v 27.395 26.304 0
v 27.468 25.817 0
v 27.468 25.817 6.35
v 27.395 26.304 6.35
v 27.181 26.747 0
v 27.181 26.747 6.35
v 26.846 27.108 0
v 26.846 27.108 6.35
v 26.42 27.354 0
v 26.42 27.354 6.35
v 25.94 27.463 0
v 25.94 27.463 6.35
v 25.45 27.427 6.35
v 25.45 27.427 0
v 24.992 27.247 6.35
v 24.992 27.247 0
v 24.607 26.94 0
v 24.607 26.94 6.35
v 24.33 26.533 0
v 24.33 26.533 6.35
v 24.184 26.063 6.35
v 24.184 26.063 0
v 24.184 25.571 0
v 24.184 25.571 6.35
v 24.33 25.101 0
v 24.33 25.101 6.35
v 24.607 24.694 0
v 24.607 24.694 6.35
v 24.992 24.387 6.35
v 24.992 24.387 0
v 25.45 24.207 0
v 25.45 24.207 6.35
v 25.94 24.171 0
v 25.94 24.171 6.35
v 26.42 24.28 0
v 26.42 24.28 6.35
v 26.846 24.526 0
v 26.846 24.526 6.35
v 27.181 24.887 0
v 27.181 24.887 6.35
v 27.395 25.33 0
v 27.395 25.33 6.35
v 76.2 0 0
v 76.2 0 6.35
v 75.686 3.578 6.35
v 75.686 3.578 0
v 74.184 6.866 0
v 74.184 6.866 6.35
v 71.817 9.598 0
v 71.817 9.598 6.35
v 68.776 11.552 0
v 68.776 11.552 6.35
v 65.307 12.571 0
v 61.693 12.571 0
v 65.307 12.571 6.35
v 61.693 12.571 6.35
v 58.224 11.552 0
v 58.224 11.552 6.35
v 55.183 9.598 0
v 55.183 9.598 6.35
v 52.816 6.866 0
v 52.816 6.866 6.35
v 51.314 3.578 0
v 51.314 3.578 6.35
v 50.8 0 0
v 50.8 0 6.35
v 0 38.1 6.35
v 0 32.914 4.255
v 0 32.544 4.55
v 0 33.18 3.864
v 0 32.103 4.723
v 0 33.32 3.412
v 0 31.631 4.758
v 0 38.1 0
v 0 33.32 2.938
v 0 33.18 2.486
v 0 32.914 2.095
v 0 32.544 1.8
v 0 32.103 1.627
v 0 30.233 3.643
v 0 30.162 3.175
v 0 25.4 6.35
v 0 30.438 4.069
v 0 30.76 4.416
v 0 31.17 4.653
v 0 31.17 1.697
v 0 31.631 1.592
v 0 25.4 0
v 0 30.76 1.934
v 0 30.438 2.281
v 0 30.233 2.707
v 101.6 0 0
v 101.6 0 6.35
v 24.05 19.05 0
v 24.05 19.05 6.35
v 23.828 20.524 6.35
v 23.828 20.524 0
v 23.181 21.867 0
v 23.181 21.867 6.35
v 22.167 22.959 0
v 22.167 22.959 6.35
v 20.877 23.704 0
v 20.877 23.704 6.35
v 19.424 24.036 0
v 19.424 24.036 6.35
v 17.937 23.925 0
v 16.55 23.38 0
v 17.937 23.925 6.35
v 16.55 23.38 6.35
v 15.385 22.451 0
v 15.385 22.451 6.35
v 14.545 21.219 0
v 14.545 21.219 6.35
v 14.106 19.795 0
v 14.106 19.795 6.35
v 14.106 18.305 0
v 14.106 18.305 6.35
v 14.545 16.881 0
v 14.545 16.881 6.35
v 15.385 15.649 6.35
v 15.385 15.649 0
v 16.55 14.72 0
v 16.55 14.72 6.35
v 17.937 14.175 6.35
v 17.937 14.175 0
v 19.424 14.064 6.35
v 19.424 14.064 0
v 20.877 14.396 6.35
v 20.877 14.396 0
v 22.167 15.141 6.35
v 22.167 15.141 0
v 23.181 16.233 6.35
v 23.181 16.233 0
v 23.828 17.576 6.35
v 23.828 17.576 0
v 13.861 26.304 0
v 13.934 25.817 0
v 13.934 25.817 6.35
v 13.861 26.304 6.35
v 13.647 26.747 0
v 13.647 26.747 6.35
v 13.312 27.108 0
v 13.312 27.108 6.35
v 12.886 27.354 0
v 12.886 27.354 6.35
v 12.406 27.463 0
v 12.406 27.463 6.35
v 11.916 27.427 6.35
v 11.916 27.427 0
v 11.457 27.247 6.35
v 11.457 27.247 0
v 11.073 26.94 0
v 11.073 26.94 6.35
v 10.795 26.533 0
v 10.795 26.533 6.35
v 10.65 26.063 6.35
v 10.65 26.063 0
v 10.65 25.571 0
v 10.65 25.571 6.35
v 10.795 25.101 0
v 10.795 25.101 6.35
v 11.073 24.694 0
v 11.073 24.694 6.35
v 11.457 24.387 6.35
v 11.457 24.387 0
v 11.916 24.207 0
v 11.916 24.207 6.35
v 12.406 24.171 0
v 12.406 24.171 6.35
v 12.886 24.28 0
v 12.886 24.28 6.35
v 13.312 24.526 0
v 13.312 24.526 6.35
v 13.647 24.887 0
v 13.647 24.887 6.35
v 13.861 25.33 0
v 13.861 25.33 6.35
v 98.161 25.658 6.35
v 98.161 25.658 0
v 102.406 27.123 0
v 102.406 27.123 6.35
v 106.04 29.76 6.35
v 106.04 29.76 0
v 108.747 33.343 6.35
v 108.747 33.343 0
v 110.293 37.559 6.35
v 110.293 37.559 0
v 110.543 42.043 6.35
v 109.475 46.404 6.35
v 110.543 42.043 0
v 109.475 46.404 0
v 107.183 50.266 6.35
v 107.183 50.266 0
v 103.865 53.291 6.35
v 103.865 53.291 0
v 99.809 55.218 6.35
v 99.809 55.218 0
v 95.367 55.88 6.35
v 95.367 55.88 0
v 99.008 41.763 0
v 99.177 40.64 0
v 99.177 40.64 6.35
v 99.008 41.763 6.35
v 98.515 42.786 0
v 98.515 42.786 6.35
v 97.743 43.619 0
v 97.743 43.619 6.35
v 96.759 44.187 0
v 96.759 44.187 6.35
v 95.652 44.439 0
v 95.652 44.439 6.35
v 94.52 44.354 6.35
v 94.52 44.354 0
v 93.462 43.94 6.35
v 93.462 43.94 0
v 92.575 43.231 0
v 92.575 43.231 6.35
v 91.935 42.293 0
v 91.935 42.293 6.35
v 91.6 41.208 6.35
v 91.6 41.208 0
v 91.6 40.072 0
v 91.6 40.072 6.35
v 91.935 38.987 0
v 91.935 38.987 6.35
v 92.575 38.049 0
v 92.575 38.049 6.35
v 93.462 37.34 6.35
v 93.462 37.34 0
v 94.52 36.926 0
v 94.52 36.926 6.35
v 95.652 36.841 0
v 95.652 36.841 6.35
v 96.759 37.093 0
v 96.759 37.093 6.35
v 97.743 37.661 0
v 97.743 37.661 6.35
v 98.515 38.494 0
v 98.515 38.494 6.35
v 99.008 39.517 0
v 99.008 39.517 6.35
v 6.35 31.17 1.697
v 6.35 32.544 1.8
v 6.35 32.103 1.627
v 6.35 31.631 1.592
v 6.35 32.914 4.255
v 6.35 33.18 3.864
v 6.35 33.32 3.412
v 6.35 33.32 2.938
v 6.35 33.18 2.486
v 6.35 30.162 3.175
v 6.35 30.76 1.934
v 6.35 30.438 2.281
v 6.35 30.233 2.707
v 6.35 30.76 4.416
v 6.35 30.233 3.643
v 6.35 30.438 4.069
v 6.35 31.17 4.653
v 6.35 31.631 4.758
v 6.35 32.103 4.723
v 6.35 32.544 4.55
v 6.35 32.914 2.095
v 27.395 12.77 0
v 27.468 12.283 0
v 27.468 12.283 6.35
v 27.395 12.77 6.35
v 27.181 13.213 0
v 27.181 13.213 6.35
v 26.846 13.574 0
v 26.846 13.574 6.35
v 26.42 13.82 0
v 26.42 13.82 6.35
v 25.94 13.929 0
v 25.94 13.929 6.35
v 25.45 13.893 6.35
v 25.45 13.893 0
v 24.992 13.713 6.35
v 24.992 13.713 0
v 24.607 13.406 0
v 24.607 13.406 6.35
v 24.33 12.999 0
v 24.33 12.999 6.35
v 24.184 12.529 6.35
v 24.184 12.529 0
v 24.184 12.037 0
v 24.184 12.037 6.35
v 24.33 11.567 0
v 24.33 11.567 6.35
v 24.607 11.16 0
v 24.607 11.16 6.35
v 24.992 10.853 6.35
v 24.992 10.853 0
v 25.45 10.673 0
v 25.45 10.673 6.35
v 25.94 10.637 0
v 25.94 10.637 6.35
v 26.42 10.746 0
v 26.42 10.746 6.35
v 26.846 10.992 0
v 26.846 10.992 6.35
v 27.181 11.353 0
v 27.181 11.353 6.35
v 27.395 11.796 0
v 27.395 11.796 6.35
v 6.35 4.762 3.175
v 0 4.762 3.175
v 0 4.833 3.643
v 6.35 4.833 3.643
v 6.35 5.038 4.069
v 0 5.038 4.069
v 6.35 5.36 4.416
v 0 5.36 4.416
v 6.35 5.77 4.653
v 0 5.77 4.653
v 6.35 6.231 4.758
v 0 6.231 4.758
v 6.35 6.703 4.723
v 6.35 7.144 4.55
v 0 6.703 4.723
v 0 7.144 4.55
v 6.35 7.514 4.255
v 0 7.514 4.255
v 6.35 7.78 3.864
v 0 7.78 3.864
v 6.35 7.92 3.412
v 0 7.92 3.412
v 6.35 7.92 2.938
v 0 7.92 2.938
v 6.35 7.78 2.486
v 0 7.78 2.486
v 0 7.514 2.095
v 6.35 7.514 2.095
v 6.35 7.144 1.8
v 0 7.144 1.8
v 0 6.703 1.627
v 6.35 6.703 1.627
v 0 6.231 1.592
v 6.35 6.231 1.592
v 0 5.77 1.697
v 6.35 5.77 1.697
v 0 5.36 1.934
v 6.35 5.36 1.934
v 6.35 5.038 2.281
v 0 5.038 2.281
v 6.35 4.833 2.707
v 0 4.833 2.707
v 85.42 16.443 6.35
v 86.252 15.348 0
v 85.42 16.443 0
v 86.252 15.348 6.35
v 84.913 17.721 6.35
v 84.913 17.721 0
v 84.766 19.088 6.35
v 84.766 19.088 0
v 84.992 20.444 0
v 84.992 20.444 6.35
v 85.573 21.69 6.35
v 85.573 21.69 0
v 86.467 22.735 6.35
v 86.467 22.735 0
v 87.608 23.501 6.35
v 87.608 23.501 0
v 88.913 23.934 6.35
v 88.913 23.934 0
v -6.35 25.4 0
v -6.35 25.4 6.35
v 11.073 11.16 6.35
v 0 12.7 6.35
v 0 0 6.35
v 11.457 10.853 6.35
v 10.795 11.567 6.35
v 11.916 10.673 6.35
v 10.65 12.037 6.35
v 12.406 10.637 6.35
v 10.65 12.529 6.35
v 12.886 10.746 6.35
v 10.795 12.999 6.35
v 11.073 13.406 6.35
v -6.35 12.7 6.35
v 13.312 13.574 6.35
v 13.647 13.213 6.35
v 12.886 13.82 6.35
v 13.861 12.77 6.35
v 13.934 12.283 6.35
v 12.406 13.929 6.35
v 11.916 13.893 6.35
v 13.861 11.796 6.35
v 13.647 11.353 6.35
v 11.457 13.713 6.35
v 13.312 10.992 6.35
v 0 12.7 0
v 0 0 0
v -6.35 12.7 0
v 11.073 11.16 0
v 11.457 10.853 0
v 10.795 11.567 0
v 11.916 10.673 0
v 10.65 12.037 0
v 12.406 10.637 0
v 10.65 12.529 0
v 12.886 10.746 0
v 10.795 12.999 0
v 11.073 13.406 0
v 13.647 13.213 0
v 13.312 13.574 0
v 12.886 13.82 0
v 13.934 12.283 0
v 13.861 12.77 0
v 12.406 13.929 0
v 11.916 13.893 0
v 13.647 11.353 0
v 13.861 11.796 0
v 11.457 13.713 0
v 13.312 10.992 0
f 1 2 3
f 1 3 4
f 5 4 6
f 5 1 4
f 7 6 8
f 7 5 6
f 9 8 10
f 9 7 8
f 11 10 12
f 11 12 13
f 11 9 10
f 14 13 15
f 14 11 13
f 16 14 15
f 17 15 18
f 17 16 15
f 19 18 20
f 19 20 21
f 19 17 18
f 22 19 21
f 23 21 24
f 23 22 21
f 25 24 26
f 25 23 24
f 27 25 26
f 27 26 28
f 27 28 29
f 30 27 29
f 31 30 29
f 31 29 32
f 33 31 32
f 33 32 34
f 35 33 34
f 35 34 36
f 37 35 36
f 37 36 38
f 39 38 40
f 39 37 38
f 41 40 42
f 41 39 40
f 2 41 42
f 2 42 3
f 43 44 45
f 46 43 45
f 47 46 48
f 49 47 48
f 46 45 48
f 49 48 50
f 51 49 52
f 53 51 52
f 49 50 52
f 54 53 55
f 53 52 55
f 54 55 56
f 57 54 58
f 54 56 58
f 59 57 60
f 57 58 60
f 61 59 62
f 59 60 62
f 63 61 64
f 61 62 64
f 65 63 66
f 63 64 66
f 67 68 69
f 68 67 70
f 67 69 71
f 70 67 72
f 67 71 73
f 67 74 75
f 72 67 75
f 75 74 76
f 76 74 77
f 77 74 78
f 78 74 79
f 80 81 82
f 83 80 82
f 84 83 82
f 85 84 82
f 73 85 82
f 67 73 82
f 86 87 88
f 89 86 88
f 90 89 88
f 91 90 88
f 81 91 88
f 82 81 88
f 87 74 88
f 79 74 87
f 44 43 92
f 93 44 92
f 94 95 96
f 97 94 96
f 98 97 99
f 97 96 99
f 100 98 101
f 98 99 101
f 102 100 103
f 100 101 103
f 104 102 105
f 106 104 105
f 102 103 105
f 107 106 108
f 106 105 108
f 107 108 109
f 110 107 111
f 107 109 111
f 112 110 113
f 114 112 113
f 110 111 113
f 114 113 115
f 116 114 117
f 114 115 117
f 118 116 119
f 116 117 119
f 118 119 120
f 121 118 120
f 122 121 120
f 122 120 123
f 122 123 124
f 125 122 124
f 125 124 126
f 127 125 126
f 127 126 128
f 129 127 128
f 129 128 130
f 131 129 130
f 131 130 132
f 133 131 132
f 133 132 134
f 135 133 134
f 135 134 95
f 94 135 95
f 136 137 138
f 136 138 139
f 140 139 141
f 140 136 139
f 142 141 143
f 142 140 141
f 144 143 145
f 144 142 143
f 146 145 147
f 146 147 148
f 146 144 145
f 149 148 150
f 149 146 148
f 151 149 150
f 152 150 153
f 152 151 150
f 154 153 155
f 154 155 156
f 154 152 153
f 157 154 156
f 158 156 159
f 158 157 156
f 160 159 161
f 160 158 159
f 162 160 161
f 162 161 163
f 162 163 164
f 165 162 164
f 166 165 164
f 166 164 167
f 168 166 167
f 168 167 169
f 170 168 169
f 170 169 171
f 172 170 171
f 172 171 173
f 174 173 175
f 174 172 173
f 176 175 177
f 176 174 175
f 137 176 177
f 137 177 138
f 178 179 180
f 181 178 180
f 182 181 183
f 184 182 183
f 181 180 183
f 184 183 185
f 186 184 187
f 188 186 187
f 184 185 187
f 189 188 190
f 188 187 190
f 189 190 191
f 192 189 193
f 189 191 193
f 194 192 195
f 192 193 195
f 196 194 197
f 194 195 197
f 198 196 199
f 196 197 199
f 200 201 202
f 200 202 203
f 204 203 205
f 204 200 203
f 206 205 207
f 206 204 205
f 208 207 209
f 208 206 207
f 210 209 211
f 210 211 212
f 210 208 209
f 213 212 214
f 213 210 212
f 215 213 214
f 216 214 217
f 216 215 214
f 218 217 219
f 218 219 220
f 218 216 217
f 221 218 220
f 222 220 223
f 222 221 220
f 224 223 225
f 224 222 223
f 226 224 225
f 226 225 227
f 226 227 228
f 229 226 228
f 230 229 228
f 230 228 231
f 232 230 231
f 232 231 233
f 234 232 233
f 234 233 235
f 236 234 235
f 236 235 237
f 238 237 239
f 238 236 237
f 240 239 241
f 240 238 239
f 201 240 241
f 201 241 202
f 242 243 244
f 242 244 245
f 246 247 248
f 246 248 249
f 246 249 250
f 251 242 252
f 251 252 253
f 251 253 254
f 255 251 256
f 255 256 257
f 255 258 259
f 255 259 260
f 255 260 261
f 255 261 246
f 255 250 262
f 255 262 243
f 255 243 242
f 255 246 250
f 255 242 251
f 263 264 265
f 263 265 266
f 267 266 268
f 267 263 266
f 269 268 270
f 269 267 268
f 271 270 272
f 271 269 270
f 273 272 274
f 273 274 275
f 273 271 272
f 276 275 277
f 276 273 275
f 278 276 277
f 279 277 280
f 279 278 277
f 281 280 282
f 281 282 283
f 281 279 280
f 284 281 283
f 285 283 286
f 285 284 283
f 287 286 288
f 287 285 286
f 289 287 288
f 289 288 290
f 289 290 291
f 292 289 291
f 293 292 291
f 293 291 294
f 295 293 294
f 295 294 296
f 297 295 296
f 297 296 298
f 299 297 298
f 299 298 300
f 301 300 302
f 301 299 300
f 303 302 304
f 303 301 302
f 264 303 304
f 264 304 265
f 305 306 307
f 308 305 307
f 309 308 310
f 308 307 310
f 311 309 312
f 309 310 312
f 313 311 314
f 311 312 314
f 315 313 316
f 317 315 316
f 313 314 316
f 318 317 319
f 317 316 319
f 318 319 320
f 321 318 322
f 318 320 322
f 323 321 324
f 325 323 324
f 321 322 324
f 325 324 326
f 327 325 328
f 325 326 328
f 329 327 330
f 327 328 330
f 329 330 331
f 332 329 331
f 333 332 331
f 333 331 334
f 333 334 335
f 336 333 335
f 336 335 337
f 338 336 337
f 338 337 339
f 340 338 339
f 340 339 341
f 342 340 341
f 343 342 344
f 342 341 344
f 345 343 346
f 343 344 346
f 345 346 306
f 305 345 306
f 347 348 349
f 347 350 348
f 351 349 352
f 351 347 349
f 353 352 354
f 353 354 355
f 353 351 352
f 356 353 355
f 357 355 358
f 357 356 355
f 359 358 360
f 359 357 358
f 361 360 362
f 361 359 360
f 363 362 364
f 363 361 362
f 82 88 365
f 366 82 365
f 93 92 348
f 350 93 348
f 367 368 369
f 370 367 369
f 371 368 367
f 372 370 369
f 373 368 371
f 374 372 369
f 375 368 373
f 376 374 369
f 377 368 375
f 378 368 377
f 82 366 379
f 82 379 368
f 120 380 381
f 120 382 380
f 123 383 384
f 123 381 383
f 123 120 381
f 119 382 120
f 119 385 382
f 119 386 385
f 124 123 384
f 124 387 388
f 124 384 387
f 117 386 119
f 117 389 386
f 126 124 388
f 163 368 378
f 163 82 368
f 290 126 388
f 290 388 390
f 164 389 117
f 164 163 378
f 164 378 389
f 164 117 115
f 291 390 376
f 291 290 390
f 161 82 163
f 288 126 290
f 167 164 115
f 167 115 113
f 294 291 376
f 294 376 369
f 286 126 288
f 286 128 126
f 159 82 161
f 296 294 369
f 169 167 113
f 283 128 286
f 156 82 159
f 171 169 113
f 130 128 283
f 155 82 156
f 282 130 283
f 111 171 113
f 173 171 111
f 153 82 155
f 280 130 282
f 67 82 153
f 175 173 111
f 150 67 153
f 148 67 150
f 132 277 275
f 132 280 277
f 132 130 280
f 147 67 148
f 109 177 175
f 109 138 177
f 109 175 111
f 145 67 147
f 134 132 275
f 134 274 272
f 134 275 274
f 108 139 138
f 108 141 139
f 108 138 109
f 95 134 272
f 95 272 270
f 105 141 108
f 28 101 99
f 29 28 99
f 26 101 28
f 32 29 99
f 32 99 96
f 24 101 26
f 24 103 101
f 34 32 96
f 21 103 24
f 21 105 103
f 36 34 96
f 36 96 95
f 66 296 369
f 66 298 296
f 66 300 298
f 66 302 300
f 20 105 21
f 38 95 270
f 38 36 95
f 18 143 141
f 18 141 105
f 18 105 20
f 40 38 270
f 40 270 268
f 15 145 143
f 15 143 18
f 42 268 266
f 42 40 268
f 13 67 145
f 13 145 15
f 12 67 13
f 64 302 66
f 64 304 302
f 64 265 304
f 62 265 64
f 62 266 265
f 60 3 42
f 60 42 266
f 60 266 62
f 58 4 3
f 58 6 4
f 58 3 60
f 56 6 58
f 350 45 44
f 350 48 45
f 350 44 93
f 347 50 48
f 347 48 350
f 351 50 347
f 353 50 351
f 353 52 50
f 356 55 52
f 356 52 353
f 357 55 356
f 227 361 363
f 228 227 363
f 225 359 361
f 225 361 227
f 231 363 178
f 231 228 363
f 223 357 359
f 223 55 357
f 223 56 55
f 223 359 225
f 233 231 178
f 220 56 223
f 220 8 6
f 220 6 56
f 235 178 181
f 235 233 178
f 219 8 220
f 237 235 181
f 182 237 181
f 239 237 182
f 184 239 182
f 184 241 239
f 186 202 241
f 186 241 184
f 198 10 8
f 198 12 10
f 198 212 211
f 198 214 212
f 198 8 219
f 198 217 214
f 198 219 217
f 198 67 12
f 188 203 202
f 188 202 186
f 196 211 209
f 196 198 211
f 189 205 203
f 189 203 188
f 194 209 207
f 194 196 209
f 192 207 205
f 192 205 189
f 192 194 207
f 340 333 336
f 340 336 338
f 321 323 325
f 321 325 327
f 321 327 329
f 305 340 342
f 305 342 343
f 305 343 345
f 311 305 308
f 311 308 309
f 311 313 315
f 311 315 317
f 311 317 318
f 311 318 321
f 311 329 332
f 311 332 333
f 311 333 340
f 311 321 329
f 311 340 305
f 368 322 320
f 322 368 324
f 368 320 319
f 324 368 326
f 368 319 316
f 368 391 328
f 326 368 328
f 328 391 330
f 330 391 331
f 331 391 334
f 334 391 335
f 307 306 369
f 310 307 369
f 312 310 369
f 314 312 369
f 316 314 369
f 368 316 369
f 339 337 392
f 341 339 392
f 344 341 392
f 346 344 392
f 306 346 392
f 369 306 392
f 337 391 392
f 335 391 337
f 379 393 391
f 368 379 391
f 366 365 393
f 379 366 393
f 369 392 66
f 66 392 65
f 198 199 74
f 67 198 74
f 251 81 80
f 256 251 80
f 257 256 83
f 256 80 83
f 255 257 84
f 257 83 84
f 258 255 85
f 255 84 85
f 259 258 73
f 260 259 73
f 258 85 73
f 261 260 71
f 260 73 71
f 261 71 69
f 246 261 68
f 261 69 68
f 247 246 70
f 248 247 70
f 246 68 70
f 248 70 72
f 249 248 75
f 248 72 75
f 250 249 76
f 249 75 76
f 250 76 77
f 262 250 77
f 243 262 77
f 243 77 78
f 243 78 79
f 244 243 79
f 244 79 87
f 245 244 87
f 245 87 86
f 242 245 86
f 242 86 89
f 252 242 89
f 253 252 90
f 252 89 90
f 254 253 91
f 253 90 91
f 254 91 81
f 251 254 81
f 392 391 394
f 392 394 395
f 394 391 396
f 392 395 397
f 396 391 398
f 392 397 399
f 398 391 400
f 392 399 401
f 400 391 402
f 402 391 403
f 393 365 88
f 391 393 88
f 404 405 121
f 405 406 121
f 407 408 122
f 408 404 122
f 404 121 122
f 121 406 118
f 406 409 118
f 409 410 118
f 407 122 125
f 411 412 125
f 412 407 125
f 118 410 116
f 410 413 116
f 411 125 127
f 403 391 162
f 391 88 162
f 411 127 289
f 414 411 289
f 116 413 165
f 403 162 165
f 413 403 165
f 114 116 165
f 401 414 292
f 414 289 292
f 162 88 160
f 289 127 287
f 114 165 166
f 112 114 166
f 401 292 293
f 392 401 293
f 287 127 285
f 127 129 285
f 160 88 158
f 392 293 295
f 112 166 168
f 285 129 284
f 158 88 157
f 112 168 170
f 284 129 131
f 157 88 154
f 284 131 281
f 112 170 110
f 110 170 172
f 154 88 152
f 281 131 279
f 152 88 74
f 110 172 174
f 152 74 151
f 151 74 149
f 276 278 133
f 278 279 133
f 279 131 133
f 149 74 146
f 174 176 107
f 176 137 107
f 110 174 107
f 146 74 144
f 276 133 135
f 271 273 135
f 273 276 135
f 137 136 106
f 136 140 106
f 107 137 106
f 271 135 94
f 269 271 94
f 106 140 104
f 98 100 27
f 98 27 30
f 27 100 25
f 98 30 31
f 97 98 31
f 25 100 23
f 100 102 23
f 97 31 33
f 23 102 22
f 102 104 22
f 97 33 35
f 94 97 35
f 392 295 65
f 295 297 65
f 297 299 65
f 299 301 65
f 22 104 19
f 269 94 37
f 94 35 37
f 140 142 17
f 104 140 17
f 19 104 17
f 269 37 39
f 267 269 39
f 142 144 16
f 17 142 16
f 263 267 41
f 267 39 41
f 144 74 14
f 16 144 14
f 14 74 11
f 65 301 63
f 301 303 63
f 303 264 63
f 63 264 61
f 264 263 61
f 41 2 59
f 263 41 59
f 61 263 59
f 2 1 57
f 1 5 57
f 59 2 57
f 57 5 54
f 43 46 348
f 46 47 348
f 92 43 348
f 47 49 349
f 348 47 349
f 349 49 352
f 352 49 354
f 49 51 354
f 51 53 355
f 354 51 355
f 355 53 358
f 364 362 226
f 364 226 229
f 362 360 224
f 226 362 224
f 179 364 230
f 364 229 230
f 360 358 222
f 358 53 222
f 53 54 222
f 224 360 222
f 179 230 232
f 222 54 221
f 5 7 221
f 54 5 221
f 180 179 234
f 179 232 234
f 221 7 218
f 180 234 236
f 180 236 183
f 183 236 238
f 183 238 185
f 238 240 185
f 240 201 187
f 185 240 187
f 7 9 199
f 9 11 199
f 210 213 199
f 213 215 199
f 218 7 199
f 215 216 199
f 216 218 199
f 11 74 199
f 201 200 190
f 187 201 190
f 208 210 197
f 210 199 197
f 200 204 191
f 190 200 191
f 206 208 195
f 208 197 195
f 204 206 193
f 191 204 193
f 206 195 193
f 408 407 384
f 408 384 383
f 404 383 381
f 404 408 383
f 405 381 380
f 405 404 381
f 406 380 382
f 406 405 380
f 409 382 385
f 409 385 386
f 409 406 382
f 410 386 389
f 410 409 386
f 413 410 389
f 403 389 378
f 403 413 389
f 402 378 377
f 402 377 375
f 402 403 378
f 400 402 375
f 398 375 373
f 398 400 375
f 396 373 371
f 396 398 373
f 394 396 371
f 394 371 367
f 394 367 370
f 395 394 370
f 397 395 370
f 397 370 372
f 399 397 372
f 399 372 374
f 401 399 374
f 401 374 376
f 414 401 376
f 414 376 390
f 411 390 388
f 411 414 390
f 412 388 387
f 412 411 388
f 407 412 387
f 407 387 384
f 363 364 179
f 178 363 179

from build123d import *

# Parameters (mm, degrees)
SKETCH1_R           = 3.81
SKETCH1_R_2         = 1.651
BOSS_EXTRUDE1_DEPTH = 6.35
FILLET2_R           = 5.08
SKETCH3_R           = 1.5875
CUT_EXTRUDE1_DEPTH  = 6.35
CUT_EXTRUDE2_DEPTH  = 6.35
SKETCH7_R           = 5.000000033
CUT_EXTRUDE3_DEPTH  = 125.084268237


with BuildPart() as part:
    # Sketch1 → Boss-Extrude1 (new body)
    with BuildSketch(Plane.XY):
        with BuildLine():
            Line((0, 0), (101.6, 0))
            Line((101.6, 0), (79.43330905, 22.16669095))
            Line((79.43330905, 22.16669095), (98.16062093, 25.658150496))
            ThreePointArc((98.16062093, 25.658150496), (110.542778436, 42.04253584), (95.367453293, 55.88))
            Line((95.367453293, 55.88), (0, 38.1))
            Line((0, 38.1), (0, 25.4))
            Line((0, 25.4), (-6.35, 25.4))
            Line((-6.35, 25.4), (-6.35, 12.7))
            Line((-6.35, 12.7), (0, 12.7))
            Line((0, 12.7), (0, 0))
        make_face()
        with Locations((95.367453293, 40.64)):
            Circle(SKETCH1_R, mode=Mode.SUBTRACT)
        with Locations((25.817011896, 25.817011896)):
            Circle(SKETCH1_R_2, mode=Mode.SUBTRACT)
        with Locations((25.817011896, 12.282988104)):
            Circle(SKETCH1_R_2, mode=Mode.SUBTRACT)
        with Locations((12.282988104, 12.282988104)):
            Circle(SKETCH1_R_2, mode=Mode.SUBTRACT)
        with Locations((12.282988104, 25.817011896)):
            Circle(SKETCH1_R_2, mode=Mode.SUBTRACT)
    extrude(amount=BOSS_EXTRUDE1_DEPTH)

    # Fillet2
    fillet2_edges = [part.edges().sort_by_distance(p)[0] for p in [
        (79.43330905, 22.16669095, 3.175),
    ]]
    fillet(fillet2_edges, radius=FILLET2_R)

    # Sketch3 → Cut-Extrude1 (cut)
    with BuildSketch(Plane.ZY):
        with Locations(Location((3.175, 31.75, 0), (0, 0, 270))):
            Circle(SKETCH3_R)
        with Locations(Location((3.175, 6.35, 0), (0, 0, 270))):
            Circle(SKETCH3_R)
    extrude(amount=-CUT_EXTRUDE1_DEPTH, mode=Mode.SUBTRACT)

    # Sketch6 → Cut-Extrude2 (cut)
    with BuildSketch(Plane.XY.offset(6.35)):
        with BuildLine():
            Line((50.8, 0), (76.2, 0))
            ThreePointArc((76.2, 0), (63.5, 12.7), (50.8, 0))
        make_face()
    extrude(amount=-CUT_EXTRUDE2_DEPTH, mode=Mode.SUBTRACT)

    # Sketch7 → Cut-Extrude3 (cut, through all)
    with BuildSketch(Plane.XY.offset(6.35)):
        with Locations((19.05, 19.05)):
            Circle(SKETCH7_R)
    extrude(amount=-CUT_EXTRUDE3_DEPTH, mode=Mode.SUBTRACT)


solid = part.part
